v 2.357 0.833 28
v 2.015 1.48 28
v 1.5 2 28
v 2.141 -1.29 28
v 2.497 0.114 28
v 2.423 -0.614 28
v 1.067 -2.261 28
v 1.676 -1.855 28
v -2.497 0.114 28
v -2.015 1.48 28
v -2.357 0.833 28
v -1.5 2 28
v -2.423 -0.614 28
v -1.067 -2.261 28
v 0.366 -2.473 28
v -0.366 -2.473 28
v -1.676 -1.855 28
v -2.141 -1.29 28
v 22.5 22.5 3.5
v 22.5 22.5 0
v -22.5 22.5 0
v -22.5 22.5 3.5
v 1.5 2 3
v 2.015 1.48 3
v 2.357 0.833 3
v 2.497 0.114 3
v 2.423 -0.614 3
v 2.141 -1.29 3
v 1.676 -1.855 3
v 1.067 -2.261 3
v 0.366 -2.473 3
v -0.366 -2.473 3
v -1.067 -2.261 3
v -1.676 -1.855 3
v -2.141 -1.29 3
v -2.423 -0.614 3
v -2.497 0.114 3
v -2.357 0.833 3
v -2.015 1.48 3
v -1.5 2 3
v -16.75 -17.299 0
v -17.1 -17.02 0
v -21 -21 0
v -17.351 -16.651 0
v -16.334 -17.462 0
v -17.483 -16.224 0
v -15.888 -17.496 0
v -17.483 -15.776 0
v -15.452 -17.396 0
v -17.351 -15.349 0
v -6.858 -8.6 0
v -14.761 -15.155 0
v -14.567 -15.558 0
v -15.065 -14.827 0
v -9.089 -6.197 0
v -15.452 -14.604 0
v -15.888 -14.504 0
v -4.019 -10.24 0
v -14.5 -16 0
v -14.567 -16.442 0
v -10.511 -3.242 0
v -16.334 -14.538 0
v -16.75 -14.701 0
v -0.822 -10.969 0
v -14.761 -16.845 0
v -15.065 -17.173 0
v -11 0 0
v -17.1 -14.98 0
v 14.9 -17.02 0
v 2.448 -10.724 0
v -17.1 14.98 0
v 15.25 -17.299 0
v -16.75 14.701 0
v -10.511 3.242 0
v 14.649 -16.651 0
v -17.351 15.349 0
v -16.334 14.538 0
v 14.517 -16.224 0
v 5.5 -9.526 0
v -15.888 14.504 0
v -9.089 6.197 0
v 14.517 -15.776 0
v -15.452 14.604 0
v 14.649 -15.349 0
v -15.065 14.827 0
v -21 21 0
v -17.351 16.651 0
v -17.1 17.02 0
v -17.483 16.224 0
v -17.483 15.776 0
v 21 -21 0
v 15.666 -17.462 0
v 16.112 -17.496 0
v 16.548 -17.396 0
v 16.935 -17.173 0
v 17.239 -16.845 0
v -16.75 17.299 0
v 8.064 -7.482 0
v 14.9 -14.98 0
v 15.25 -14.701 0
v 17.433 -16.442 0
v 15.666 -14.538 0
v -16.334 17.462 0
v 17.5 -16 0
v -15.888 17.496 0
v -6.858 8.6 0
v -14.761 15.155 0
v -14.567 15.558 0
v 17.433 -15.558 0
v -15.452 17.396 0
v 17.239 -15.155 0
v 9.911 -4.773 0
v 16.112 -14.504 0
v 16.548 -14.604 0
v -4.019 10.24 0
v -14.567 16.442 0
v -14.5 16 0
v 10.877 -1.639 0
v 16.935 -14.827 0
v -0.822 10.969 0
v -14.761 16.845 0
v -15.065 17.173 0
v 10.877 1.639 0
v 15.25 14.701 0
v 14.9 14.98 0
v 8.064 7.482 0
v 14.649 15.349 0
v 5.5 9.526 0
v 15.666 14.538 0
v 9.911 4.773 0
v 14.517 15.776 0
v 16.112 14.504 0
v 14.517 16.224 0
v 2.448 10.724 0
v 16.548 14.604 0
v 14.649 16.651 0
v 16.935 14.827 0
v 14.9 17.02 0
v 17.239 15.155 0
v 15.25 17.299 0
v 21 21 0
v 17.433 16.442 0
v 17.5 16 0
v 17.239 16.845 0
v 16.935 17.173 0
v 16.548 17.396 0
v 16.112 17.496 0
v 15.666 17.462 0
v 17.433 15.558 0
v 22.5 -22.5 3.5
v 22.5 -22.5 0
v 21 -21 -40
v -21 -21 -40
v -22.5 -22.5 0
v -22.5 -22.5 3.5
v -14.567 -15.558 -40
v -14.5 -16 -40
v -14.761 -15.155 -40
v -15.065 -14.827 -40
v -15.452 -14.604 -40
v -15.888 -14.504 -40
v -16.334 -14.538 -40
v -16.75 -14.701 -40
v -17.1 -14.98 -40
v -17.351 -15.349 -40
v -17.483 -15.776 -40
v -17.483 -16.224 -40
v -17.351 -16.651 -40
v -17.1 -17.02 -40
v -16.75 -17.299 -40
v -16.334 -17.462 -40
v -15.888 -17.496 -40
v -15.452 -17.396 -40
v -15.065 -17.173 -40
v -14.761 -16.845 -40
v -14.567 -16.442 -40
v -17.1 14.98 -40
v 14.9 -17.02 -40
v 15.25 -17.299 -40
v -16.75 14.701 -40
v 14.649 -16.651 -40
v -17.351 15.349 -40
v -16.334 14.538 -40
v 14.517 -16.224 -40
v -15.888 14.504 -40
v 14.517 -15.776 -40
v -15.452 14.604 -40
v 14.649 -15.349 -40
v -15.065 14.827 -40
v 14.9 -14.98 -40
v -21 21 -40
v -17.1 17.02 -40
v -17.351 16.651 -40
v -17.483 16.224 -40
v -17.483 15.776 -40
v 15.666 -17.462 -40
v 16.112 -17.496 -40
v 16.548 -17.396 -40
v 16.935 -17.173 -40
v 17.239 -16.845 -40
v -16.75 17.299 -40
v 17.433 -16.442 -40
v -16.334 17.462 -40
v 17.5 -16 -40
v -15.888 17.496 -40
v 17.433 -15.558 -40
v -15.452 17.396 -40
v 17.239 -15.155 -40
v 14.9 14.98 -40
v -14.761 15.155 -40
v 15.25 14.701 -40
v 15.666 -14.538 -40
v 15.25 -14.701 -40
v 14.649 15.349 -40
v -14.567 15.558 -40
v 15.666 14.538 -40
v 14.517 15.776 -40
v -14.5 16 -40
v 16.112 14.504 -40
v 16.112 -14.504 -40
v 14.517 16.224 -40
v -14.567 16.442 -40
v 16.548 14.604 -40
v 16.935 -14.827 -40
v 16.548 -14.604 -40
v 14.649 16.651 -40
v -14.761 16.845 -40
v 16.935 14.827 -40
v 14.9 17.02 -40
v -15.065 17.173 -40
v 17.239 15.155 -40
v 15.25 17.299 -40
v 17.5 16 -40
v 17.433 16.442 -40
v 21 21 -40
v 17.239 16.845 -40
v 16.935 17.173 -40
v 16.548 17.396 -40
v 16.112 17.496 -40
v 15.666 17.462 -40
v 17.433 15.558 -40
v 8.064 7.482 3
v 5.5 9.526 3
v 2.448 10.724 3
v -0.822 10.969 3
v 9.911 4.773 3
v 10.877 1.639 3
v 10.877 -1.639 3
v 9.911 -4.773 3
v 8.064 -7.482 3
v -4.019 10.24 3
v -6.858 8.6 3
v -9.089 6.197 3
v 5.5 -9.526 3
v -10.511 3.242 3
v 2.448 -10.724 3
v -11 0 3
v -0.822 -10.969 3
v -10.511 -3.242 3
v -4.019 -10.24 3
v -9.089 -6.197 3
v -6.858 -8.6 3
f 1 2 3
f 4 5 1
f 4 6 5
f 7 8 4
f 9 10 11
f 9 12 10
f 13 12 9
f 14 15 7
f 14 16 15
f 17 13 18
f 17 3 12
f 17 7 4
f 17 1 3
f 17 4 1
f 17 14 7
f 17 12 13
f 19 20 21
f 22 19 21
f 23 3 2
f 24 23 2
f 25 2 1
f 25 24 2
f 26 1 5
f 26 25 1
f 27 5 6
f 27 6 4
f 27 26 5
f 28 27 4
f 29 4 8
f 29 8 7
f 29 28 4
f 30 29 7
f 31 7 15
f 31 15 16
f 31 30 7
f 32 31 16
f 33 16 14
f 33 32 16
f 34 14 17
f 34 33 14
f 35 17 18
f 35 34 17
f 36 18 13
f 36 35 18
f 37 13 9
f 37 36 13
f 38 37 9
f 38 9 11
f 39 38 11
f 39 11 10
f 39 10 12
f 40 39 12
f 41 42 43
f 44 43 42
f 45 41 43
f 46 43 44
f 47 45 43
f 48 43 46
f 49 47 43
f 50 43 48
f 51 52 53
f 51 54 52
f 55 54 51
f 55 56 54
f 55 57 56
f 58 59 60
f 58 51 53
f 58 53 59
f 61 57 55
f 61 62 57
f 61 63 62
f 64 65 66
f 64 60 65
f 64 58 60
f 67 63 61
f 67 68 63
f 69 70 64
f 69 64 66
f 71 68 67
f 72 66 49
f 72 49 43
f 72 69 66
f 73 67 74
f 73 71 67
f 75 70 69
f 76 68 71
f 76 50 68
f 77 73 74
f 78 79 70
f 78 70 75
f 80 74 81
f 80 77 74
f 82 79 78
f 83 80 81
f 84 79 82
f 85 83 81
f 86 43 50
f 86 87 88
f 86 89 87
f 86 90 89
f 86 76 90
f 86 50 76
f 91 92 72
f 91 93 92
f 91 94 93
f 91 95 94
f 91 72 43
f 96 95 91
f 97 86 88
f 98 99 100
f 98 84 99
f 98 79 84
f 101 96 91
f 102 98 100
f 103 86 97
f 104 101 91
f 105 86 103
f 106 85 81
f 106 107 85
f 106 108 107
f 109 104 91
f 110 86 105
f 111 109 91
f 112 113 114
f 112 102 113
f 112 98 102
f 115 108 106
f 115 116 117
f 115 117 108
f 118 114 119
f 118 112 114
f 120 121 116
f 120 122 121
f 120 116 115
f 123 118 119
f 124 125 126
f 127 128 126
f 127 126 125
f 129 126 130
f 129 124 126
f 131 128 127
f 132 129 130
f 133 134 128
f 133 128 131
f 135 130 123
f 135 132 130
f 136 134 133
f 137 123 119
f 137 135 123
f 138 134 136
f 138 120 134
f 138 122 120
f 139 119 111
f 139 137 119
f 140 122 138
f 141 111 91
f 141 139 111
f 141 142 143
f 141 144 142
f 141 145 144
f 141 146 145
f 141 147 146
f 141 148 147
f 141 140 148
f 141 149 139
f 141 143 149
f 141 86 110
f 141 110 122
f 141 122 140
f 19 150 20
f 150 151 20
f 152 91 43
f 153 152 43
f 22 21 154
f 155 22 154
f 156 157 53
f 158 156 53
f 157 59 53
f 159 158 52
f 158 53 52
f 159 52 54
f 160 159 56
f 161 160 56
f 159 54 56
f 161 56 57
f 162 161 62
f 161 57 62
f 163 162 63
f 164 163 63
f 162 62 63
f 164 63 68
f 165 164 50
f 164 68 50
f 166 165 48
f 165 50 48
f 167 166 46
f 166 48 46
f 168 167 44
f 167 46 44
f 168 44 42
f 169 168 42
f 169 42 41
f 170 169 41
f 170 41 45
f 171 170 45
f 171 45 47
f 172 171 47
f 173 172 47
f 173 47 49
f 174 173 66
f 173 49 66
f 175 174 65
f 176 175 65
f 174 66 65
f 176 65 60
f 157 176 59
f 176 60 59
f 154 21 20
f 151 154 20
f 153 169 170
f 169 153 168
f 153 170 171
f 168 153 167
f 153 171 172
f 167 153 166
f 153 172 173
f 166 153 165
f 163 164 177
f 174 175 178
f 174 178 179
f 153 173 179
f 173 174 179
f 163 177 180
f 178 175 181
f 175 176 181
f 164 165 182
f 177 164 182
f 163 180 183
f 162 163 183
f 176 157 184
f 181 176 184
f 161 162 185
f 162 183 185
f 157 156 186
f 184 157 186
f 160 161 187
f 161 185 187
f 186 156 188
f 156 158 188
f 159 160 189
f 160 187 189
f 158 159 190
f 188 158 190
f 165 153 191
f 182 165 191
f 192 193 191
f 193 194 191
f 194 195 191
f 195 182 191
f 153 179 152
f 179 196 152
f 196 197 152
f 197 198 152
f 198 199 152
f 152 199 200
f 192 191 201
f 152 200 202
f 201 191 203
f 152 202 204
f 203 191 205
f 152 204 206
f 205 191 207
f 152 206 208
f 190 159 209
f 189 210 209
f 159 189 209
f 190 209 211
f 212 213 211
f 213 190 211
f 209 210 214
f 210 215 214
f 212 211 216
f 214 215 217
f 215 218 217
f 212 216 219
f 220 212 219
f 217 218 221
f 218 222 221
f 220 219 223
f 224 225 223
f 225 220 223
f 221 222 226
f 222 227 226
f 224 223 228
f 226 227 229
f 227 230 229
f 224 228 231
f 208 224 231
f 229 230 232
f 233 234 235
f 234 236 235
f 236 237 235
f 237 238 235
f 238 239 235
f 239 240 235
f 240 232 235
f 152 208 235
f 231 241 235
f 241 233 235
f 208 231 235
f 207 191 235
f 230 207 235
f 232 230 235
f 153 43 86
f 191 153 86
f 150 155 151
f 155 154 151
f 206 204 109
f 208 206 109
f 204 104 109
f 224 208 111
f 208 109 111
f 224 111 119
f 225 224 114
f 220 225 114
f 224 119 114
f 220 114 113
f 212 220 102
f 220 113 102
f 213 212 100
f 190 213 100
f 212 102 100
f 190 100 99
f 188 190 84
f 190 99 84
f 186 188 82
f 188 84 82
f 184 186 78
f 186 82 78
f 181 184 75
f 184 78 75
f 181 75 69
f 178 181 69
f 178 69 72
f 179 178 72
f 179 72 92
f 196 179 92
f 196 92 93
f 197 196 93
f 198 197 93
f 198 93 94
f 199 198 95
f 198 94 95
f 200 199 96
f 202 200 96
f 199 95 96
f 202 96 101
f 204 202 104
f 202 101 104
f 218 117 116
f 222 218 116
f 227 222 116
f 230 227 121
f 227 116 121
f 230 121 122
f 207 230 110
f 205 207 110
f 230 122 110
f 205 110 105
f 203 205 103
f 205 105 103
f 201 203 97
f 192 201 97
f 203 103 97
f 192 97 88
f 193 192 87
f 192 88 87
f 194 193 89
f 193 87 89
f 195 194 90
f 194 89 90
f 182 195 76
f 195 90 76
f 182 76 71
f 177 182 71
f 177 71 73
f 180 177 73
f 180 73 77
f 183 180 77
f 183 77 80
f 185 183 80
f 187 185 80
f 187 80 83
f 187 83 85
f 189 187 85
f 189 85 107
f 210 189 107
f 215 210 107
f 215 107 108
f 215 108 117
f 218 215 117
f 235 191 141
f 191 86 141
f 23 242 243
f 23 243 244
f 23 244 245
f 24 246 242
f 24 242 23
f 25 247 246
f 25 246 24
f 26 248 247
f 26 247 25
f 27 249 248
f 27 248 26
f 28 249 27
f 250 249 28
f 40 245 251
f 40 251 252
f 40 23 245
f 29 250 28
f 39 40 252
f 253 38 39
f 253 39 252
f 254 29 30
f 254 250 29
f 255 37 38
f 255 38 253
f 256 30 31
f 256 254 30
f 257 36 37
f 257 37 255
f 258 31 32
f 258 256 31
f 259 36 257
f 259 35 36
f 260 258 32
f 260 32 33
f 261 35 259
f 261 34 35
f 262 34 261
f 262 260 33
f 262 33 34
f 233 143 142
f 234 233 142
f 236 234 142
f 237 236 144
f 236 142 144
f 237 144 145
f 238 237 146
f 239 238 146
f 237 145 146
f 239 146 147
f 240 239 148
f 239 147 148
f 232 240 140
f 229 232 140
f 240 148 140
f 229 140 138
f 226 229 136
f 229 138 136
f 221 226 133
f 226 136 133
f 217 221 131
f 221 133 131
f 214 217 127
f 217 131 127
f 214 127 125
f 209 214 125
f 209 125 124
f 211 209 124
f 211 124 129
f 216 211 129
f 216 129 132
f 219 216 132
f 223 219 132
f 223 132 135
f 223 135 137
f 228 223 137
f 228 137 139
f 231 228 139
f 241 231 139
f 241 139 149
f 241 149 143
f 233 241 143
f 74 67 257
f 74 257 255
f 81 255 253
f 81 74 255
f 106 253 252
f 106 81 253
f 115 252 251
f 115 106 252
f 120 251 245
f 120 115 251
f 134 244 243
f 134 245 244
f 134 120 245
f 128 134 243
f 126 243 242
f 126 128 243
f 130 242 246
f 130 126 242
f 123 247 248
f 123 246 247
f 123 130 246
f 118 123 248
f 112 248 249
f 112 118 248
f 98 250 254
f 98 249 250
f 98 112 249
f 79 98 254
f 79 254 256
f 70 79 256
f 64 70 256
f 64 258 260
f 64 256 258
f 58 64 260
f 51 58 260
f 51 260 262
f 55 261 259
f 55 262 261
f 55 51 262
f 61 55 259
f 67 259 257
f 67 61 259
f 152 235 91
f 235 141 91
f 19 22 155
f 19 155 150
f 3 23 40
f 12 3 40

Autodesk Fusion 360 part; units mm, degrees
sketch "Sketch1" plane through (0, 0, 0) normal (0, 0, 1) x (1, 0, 0)
  line L0 (21, -21) -> (-21, -21)
  line L1 (-21, -21) -> (-21, 21)
  line L2 (-21, 21) -> (21, 21)
  line L3 (21, 21) -> (21, -21)
  line L4 (21, -21) -> (-21, 21) construction
  line L5 (-21, -21) -> (21, 21) construction
  circle A0 centre (16, -16) radius 1.5
  line L6 (0, 0) -> (21, 0)
  line L7 (0, 0) -> (0, -21)
  line L8 (0, 0) -> (0, 21)
  line L9 (0, 0) -> (-21, 0)
  circle A1 centre (16, 16) radius 1.5
  circle A2 centre (-16, -16) radius 1.5
  circle A3 centre (-16, 16) radius 1.5
  dimension "d1" = 42
  dimension "d2" = 42
  dimension "d3" = 3
  dimension "d4" = 5
  dimension "d5" = 5
extrude "Extrude1" add sketch "Sketch1" against normal blind 40 makes body 1
sketch "Sketch2" plane through (0, 0, 0) normal (0, 0, 1) x (-1, 0, 0)
  circle A0 centre (16, -16) radius 1.5
  circle A1 centre (-16, -16) radius 1.5
  circle A2 centre (-16, 16) radius 1.5
  circle A3 centre (16, 16) radius 1.5
  line L0 (-21, -21) -> (21, -21)
  line L1 (21, -21) -> (21, 21)
  line L2 (21, 21) -> (-21, 21)
  line L3 (-21, 21) -> (-21, -21)
  circle A4 centre (0, 0) radius 11
  dimension "d8" = 22
extrude "Extrude2" add sketch "Sketch2" along normal blind 3 contours A4 bodies 1
sketch "Sketch3" plane through (0, 0, 3) normal (0, 0, 1) x (-1, 0, 0)
  circle A0 centre (0, 0) radius 11
  circle A1 centre (0, 0) radius 2.5
  circle A2 centre (0, 0) radius 2
  line L0 (0, -2) -> (1.5, -2)
  line L1 (-1.5, -2) -> (0, -2)
  line L2 (0, 0) -> (0, -2.5)
  dimension "d11" = 5
  dimension "d12" = 4
extrude "Extrude3" add sketch "Sketch3" along normal blind 25 contours A2 | A1 L0 L1 bodies 1
sketch "Sketch4" plane through (0, 0, 0) normal (0, 1, 0) x (1, 0, 0)
sketch "Sketch5" plane through (0, 0, 0) normal (0, 0, 1) x (1, 0, 0)
sketch "Sketch1 (2)" plane through (0, 0, 0) normal (0, 0, 1) x (1, 0, 0) in component "Component"
  line L0 (21.25, 21.25) -> (-21.25, 21.25)
  line L1 (-21.25, 21.25) -> (-21.25, -21.25)
  line L2 (-21.25, -21.25) -> (21.25, -21.25)
  line L3 (21.25, -21.25) -> (21.25, 21.25)
  line L4 (21.25, 21.25) -> (-21.25, -21.25) construction
  line L5 (-21.25, 21.25) -> (21.25, -21.25) construction
  line L6 (22.5, 22.5) -> (-22.5, 22.5)
  line L7 (-22.5, 22.5) -> (-22.5, -22.5)
  line L8 (-22.5, -22.5) -> (22.5, -22.5)
  line L9 (22.5, -22.5) -> (22.5, 22.5)
  line L10 (22.5, 22.5) -> (-22.5, -22.5) construction
  line L11 (-22.5, 22.5) -> (22.5, -22.5) construction
  line L12 (0, 0) -> (0, -21.25)
  line L13 (0, 0) -> (-21.25, 0)
  line L14 (0, 0) -> (0, 21.25)
  line L15 (0, 0) -> (21.25, 0)
  circle A0 centre (17.5, -17.5) radius 1.5
  circle A1 centre (-17.5, -17.5) radius 1.5
  circle A2 centre (17.5, 17.5) radius 1.5
  circle A3 centre (-17.5, 17.5) radius 1.5
  dimension "d15" = 42.5
  dimension "d16" = 42.5
  dimension "d17" = 45
  dimension "d18" = 45
  dimension "d21" = 3
  dimension "d22" = 3.75
extrude "Extrude1'" add sketch "Sketch1 (2)" along normal blind 3.5 separate body contours L0 L3 L14 L15 | L0 L1 L13 L14 | L2 L3 L12 L15 | L1 L2 L12 L13 | L6 L7 L8 L9 | A0 | A1 | A2 | A3 makes body 2 in component "Component"
component "Component" placed x (1, 0, 0) y (0, 1, 0) z (0, 0, 1) at (0, 0, 0)
